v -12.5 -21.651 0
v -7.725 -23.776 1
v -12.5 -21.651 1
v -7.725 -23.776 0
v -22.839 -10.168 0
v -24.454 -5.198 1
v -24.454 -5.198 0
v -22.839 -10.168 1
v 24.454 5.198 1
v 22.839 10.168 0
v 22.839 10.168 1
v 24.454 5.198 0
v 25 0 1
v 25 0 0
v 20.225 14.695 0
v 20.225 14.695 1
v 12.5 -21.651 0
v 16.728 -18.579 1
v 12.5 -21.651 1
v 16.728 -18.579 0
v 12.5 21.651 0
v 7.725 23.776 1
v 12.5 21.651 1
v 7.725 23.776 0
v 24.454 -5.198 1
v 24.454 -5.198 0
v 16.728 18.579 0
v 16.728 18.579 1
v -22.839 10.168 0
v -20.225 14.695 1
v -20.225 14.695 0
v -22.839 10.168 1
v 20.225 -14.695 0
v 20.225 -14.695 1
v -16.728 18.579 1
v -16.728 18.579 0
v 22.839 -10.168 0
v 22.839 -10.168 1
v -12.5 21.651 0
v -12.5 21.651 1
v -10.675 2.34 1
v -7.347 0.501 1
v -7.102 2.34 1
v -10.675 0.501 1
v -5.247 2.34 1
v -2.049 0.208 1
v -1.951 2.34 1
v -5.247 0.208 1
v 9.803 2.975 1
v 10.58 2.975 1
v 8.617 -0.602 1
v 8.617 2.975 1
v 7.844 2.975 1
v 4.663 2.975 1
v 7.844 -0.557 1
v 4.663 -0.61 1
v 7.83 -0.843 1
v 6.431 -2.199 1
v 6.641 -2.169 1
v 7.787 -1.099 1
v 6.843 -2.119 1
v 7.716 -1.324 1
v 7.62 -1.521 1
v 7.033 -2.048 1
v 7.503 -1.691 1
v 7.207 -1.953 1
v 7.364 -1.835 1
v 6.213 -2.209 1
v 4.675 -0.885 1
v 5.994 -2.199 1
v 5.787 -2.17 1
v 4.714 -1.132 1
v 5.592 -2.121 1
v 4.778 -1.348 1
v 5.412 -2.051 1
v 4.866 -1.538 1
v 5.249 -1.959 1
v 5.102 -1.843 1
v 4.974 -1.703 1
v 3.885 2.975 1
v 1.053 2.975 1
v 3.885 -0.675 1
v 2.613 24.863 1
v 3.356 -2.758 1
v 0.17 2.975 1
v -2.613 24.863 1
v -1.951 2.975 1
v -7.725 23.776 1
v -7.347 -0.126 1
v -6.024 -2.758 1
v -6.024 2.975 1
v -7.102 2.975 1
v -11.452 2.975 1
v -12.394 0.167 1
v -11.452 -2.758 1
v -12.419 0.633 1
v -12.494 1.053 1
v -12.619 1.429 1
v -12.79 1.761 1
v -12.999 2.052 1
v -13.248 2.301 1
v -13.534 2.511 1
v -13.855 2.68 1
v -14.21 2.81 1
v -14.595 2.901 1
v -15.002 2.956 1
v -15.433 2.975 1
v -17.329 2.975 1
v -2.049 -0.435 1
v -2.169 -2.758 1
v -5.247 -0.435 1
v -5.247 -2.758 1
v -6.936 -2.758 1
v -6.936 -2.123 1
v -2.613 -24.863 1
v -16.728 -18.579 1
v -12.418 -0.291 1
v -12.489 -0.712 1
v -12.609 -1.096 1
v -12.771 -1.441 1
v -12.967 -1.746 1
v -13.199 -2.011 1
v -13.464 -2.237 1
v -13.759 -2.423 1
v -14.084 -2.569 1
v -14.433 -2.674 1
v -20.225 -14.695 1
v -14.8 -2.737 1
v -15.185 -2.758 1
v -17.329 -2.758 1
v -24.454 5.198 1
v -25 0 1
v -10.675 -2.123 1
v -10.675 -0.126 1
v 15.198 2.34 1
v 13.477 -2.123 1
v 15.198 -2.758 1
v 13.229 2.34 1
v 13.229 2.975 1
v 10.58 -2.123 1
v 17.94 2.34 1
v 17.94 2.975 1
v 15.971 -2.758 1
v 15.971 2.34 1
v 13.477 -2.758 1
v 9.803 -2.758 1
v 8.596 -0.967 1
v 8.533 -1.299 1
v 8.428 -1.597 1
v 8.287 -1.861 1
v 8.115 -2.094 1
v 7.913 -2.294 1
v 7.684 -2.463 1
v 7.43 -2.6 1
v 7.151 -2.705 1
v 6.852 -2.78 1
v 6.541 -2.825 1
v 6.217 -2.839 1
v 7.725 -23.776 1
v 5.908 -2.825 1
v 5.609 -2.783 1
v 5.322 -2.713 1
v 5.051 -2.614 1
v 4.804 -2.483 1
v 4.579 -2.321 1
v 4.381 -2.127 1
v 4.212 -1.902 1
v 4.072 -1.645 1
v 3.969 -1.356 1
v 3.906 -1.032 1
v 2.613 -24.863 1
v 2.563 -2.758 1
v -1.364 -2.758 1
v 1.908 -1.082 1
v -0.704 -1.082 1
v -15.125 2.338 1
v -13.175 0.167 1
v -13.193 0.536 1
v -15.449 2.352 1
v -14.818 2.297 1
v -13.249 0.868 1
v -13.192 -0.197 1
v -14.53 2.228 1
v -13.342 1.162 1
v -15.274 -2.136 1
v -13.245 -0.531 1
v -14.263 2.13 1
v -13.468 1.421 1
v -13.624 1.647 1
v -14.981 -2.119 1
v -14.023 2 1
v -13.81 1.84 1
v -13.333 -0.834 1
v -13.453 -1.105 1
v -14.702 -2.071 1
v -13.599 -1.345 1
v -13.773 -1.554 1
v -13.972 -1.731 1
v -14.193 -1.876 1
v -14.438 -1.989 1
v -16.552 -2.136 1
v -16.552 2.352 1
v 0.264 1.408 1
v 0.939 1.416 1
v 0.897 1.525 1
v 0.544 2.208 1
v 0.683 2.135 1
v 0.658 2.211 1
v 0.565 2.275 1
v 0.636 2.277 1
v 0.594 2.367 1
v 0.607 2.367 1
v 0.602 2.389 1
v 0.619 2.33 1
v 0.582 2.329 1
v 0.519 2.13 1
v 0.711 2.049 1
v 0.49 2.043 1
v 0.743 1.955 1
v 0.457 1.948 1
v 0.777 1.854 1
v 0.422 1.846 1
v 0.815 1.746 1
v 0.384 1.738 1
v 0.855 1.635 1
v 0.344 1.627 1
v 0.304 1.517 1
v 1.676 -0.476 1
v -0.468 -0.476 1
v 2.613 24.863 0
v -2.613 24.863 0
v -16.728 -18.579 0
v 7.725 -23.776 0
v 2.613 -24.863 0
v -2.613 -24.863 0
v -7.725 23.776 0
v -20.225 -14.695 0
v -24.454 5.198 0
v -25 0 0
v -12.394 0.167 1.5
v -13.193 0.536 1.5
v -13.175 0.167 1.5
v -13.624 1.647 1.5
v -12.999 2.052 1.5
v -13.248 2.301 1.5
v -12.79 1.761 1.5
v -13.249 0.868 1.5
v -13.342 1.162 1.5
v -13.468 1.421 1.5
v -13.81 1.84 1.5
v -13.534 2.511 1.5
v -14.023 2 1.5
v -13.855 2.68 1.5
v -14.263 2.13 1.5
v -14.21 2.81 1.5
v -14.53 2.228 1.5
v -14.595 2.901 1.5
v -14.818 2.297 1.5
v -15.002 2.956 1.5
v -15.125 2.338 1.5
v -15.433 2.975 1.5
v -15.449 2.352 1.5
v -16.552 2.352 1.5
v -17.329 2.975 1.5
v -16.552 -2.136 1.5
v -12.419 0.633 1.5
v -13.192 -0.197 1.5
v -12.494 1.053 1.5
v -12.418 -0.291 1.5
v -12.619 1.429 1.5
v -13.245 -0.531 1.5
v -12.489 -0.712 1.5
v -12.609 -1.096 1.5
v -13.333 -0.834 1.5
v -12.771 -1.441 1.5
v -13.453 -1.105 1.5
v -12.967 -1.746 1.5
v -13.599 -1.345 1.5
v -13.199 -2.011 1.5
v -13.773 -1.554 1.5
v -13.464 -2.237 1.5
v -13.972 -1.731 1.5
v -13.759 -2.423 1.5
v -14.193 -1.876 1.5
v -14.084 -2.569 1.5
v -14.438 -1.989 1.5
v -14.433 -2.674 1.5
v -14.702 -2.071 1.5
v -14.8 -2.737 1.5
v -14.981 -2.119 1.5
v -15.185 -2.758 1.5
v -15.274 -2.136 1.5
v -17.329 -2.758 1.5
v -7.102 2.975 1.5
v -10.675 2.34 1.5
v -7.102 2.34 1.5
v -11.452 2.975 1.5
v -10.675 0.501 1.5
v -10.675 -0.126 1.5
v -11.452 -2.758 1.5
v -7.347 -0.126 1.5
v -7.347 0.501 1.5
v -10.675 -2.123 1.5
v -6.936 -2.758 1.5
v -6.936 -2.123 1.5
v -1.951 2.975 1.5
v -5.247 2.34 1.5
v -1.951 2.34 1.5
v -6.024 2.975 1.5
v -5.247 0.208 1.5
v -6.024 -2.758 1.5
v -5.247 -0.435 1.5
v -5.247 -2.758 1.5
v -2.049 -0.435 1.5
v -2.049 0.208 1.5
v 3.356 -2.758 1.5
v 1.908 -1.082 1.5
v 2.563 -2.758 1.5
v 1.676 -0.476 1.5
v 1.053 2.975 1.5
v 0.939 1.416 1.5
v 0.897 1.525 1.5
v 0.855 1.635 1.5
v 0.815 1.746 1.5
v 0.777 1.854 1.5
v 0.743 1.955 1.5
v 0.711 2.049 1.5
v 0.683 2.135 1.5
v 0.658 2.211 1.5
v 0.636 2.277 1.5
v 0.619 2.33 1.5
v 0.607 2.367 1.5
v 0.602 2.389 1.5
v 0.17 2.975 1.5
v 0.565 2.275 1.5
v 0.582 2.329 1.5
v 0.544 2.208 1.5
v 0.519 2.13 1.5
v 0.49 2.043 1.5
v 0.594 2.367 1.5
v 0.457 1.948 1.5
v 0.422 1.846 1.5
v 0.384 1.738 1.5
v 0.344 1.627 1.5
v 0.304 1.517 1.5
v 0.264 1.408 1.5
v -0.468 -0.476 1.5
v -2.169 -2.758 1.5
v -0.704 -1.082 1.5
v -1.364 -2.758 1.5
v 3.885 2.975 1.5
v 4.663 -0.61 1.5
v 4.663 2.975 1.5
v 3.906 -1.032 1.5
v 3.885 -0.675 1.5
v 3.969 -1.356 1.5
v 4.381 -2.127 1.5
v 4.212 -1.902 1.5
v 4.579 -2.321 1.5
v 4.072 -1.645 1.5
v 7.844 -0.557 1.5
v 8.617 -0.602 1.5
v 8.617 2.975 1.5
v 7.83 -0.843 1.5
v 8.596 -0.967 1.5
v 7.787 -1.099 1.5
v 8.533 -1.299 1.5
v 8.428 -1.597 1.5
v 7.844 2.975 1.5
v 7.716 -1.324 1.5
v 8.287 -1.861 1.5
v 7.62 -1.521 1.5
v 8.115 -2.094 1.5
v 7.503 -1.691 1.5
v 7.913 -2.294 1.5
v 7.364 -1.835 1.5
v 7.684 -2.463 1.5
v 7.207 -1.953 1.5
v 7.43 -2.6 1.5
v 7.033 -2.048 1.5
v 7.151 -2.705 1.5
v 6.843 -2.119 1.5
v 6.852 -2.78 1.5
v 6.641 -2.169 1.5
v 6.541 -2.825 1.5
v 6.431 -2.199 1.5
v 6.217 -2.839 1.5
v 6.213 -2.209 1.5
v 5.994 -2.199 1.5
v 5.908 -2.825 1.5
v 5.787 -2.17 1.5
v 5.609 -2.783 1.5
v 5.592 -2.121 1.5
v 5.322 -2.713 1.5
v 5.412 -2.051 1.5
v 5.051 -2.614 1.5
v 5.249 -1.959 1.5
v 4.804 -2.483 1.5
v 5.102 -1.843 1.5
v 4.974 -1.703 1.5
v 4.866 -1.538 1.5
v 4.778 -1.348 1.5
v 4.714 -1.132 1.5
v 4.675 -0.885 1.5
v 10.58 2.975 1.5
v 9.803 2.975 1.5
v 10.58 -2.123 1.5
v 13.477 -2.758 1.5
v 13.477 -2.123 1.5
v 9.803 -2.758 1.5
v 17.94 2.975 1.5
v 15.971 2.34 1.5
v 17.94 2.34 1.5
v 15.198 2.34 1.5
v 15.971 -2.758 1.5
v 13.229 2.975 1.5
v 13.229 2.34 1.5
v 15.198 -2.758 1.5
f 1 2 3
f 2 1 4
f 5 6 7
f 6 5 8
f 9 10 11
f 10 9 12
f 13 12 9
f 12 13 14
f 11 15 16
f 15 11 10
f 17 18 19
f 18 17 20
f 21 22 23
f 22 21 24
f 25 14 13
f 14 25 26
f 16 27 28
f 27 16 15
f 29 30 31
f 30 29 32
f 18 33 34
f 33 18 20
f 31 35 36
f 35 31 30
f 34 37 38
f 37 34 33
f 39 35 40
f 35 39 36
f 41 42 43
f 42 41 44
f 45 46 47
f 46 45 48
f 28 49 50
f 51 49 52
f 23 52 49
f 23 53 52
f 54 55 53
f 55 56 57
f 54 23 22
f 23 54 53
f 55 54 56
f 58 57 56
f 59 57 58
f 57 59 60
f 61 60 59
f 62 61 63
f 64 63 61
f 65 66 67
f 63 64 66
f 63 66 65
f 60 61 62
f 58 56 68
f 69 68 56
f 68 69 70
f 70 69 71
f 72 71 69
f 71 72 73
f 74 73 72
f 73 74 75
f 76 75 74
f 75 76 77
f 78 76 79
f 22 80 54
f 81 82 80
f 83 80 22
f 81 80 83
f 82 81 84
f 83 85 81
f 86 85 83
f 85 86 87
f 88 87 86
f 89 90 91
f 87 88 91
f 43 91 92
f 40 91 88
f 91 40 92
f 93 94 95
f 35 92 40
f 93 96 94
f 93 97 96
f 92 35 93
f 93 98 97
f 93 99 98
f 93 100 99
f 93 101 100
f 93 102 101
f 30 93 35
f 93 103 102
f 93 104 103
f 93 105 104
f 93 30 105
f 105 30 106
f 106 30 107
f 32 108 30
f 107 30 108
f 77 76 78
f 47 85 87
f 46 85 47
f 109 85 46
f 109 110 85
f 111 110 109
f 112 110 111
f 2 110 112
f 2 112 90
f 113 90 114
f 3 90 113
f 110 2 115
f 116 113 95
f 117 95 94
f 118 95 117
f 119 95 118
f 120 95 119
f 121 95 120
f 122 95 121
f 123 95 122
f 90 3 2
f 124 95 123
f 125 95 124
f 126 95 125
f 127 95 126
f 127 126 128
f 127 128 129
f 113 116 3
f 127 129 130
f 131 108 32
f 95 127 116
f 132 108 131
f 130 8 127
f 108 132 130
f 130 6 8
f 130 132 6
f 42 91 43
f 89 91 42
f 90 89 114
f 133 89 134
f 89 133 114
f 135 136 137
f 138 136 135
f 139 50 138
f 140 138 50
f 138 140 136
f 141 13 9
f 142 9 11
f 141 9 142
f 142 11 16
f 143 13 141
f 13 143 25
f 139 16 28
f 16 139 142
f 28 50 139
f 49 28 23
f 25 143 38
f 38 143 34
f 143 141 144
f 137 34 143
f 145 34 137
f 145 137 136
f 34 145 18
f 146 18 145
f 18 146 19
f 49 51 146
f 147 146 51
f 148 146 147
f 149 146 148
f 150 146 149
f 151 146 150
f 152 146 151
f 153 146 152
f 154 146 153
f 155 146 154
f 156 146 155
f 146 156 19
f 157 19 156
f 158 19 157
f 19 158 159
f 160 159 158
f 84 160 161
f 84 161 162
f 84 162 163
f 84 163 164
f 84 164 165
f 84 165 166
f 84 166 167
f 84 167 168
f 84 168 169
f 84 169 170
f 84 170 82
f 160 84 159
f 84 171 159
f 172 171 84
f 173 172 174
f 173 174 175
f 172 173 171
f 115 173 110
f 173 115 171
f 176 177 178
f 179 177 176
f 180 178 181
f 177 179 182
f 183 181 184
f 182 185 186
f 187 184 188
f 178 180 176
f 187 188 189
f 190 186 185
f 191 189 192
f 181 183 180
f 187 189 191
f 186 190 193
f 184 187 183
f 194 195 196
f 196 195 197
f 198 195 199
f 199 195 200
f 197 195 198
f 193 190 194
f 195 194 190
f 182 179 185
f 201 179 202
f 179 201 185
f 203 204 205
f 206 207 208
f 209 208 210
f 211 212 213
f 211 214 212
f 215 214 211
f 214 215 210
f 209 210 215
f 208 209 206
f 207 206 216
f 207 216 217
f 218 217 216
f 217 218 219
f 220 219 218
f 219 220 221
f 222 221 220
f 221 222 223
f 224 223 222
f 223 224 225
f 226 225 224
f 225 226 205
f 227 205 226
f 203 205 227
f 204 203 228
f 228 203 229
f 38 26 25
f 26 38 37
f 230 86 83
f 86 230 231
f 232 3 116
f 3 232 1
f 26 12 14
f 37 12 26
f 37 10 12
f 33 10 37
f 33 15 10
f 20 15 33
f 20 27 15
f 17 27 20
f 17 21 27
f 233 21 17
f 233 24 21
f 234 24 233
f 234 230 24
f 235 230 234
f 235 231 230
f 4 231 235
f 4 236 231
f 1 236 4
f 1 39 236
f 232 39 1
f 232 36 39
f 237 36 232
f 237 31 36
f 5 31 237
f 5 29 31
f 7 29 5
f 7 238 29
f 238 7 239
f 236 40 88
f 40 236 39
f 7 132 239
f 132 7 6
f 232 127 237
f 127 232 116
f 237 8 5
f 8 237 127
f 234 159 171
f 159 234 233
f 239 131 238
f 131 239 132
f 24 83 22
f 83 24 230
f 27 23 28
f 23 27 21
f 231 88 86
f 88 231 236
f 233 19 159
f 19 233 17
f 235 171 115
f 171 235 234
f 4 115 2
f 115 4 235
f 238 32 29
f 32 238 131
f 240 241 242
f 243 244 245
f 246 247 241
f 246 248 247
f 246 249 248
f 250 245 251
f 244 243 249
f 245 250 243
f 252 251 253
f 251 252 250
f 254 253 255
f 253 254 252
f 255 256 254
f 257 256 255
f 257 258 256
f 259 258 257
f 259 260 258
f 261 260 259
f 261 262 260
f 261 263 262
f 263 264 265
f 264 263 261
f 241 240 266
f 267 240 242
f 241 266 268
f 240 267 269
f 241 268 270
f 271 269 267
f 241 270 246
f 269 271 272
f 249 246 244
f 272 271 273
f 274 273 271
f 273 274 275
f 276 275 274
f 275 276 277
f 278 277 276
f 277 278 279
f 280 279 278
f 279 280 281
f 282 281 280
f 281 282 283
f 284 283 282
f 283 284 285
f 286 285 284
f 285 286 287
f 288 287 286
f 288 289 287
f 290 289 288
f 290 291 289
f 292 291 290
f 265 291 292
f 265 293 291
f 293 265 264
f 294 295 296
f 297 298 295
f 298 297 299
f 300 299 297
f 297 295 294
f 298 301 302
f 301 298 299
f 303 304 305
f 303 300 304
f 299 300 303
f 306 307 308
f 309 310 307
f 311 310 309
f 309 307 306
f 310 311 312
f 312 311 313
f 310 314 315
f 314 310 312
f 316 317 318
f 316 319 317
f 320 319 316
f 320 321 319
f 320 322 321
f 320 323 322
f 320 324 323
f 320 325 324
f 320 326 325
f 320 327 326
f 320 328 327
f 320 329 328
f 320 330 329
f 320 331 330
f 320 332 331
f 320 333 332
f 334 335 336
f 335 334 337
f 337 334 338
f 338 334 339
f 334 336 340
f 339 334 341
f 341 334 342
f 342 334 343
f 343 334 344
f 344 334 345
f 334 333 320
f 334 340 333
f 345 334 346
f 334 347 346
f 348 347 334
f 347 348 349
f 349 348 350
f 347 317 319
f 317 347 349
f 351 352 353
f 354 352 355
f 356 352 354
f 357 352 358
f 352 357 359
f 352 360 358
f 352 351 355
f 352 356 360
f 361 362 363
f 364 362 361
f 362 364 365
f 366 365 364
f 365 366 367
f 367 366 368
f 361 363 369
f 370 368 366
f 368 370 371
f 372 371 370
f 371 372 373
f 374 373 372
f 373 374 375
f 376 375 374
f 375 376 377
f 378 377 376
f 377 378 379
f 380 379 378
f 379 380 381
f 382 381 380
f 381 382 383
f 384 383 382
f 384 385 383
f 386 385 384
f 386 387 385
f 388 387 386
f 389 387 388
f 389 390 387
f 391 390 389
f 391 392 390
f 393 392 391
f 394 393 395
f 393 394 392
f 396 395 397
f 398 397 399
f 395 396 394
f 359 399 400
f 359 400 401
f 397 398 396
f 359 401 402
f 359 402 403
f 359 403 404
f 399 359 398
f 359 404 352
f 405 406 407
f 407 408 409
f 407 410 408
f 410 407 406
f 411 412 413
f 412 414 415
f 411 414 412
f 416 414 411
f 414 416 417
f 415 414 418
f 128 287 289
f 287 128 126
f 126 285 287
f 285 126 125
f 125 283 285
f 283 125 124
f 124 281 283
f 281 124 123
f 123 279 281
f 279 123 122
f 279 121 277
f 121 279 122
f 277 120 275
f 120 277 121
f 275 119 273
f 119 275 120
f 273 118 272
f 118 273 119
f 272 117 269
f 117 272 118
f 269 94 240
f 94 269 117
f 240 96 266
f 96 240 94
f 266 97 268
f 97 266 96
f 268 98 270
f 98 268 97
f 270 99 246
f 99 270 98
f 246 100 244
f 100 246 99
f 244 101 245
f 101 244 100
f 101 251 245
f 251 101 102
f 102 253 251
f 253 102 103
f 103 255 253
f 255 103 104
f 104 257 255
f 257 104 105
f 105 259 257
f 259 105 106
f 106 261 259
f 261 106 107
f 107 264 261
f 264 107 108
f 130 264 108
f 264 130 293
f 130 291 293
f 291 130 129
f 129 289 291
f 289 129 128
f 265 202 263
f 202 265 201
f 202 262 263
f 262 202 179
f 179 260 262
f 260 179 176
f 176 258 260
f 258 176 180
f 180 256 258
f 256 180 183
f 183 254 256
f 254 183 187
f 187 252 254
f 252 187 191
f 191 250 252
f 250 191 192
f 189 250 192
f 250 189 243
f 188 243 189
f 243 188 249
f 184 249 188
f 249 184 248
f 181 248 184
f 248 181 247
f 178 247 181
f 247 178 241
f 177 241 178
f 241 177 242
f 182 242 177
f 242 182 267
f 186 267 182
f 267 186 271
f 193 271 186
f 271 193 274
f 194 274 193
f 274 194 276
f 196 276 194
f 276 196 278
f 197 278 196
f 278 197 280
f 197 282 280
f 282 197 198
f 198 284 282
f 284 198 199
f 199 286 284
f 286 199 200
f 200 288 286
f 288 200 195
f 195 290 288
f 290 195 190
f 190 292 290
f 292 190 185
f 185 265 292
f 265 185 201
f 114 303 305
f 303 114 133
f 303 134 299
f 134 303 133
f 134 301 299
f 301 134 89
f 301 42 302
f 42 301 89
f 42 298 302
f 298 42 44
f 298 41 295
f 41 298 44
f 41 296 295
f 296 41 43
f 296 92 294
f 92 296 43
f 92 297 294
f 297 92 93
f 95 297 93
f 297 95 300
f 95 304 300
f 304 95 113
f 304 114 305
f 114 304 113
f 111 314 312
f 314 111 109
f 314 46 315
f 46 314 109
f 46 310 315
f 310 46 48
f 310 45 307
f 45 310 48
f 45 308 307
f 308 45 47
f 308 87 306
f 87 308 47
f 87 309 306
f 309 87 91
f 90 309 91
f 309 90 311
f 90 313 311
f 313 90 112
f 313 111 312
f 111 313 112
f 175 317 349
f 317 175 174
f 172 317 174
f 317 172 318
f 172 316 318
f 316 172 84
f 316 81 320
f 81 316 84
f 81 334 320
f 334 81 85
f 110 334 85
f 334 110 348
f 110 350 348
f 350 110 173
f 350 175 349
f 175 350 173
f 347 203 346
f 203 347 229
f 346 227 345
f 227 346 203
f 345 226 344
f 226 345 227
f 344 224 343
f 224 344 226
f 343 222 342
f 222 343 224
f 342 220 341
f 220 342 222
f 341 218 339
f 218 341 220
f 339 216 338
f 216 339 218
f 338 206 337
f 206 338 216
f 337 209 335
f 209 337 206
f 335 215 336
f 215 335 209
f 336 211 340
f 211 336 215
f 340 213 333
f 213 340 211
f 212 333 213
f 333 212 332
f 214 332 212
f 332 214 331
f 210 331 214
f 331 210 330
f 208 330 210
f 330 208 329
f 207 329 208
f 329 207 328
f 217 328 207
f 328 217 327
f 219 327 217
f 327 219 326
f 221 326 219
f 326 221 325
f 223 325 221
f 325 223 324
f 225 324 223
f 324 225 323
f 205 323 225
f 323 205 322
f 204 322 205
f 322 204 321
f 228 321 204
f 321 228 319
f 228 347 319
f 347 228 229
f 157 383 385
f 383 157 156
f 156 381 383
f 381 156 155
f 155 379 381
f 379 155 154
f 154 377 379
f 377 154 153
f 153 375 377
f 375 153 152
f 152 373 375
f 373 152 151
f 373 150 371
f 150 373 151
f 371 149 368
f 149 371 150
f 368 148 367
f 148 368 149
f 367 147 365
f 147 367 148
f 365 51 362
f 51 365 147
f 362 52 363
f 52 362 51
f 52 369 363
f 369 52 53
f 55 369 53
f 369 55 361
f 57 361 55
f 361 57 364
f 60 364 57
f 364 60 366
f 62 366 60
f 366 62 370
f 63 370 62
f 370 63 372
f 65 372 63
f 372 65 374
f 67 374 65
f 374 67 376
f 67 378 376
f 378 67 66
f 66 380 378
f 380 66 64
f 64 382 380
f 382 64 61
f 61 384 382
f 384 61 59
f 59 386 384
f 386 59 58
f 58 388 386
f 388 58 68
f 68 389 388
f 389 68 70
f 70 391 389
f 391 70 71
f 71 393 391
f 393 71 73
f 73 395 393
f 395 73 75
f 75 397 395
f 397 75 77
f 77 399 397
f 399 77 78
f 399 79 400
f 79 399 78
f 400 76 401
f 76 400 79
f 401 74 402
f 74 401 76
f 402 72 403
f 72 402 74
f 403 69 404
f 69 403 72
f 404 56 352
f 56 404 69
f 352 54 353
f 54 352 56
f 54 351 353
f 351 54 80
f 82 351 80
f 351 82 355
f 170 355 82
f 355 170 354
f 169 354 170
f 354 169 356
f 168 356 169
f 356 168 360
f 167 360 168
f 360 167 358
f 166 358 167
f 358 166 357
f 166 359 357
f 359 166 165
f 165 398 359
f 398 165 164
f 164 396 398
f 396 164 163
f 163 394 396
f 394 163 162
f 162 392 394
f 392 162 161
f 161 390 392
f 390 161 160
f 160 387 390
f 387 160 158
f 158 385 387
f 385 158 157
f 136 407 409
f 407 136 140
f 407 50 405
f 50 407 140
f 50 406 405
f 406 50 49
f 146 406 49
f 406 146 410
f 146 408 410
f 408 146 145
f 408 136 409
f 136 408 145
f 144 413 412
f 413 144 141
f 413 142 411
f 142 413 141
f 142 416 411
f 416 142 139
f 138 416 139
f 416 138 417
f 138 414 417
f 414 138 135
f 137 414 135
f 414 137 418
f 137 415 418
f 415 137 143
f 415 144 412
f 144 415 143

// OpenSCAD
// The following line is requied for file to be included in OSBS build
/* OSBS:build */

// Set the default values of variables; they may be changed later by OSBS
text = "DEFAULT";
diameter = 50;
thickness = 1;

cylinder(d = diameter, h = thickness);
translate([0, 0, thickness]) 
    linear_extrude(thickness / 2) 
        text(text = text, size = 6, halign = "center", valign = "center");
